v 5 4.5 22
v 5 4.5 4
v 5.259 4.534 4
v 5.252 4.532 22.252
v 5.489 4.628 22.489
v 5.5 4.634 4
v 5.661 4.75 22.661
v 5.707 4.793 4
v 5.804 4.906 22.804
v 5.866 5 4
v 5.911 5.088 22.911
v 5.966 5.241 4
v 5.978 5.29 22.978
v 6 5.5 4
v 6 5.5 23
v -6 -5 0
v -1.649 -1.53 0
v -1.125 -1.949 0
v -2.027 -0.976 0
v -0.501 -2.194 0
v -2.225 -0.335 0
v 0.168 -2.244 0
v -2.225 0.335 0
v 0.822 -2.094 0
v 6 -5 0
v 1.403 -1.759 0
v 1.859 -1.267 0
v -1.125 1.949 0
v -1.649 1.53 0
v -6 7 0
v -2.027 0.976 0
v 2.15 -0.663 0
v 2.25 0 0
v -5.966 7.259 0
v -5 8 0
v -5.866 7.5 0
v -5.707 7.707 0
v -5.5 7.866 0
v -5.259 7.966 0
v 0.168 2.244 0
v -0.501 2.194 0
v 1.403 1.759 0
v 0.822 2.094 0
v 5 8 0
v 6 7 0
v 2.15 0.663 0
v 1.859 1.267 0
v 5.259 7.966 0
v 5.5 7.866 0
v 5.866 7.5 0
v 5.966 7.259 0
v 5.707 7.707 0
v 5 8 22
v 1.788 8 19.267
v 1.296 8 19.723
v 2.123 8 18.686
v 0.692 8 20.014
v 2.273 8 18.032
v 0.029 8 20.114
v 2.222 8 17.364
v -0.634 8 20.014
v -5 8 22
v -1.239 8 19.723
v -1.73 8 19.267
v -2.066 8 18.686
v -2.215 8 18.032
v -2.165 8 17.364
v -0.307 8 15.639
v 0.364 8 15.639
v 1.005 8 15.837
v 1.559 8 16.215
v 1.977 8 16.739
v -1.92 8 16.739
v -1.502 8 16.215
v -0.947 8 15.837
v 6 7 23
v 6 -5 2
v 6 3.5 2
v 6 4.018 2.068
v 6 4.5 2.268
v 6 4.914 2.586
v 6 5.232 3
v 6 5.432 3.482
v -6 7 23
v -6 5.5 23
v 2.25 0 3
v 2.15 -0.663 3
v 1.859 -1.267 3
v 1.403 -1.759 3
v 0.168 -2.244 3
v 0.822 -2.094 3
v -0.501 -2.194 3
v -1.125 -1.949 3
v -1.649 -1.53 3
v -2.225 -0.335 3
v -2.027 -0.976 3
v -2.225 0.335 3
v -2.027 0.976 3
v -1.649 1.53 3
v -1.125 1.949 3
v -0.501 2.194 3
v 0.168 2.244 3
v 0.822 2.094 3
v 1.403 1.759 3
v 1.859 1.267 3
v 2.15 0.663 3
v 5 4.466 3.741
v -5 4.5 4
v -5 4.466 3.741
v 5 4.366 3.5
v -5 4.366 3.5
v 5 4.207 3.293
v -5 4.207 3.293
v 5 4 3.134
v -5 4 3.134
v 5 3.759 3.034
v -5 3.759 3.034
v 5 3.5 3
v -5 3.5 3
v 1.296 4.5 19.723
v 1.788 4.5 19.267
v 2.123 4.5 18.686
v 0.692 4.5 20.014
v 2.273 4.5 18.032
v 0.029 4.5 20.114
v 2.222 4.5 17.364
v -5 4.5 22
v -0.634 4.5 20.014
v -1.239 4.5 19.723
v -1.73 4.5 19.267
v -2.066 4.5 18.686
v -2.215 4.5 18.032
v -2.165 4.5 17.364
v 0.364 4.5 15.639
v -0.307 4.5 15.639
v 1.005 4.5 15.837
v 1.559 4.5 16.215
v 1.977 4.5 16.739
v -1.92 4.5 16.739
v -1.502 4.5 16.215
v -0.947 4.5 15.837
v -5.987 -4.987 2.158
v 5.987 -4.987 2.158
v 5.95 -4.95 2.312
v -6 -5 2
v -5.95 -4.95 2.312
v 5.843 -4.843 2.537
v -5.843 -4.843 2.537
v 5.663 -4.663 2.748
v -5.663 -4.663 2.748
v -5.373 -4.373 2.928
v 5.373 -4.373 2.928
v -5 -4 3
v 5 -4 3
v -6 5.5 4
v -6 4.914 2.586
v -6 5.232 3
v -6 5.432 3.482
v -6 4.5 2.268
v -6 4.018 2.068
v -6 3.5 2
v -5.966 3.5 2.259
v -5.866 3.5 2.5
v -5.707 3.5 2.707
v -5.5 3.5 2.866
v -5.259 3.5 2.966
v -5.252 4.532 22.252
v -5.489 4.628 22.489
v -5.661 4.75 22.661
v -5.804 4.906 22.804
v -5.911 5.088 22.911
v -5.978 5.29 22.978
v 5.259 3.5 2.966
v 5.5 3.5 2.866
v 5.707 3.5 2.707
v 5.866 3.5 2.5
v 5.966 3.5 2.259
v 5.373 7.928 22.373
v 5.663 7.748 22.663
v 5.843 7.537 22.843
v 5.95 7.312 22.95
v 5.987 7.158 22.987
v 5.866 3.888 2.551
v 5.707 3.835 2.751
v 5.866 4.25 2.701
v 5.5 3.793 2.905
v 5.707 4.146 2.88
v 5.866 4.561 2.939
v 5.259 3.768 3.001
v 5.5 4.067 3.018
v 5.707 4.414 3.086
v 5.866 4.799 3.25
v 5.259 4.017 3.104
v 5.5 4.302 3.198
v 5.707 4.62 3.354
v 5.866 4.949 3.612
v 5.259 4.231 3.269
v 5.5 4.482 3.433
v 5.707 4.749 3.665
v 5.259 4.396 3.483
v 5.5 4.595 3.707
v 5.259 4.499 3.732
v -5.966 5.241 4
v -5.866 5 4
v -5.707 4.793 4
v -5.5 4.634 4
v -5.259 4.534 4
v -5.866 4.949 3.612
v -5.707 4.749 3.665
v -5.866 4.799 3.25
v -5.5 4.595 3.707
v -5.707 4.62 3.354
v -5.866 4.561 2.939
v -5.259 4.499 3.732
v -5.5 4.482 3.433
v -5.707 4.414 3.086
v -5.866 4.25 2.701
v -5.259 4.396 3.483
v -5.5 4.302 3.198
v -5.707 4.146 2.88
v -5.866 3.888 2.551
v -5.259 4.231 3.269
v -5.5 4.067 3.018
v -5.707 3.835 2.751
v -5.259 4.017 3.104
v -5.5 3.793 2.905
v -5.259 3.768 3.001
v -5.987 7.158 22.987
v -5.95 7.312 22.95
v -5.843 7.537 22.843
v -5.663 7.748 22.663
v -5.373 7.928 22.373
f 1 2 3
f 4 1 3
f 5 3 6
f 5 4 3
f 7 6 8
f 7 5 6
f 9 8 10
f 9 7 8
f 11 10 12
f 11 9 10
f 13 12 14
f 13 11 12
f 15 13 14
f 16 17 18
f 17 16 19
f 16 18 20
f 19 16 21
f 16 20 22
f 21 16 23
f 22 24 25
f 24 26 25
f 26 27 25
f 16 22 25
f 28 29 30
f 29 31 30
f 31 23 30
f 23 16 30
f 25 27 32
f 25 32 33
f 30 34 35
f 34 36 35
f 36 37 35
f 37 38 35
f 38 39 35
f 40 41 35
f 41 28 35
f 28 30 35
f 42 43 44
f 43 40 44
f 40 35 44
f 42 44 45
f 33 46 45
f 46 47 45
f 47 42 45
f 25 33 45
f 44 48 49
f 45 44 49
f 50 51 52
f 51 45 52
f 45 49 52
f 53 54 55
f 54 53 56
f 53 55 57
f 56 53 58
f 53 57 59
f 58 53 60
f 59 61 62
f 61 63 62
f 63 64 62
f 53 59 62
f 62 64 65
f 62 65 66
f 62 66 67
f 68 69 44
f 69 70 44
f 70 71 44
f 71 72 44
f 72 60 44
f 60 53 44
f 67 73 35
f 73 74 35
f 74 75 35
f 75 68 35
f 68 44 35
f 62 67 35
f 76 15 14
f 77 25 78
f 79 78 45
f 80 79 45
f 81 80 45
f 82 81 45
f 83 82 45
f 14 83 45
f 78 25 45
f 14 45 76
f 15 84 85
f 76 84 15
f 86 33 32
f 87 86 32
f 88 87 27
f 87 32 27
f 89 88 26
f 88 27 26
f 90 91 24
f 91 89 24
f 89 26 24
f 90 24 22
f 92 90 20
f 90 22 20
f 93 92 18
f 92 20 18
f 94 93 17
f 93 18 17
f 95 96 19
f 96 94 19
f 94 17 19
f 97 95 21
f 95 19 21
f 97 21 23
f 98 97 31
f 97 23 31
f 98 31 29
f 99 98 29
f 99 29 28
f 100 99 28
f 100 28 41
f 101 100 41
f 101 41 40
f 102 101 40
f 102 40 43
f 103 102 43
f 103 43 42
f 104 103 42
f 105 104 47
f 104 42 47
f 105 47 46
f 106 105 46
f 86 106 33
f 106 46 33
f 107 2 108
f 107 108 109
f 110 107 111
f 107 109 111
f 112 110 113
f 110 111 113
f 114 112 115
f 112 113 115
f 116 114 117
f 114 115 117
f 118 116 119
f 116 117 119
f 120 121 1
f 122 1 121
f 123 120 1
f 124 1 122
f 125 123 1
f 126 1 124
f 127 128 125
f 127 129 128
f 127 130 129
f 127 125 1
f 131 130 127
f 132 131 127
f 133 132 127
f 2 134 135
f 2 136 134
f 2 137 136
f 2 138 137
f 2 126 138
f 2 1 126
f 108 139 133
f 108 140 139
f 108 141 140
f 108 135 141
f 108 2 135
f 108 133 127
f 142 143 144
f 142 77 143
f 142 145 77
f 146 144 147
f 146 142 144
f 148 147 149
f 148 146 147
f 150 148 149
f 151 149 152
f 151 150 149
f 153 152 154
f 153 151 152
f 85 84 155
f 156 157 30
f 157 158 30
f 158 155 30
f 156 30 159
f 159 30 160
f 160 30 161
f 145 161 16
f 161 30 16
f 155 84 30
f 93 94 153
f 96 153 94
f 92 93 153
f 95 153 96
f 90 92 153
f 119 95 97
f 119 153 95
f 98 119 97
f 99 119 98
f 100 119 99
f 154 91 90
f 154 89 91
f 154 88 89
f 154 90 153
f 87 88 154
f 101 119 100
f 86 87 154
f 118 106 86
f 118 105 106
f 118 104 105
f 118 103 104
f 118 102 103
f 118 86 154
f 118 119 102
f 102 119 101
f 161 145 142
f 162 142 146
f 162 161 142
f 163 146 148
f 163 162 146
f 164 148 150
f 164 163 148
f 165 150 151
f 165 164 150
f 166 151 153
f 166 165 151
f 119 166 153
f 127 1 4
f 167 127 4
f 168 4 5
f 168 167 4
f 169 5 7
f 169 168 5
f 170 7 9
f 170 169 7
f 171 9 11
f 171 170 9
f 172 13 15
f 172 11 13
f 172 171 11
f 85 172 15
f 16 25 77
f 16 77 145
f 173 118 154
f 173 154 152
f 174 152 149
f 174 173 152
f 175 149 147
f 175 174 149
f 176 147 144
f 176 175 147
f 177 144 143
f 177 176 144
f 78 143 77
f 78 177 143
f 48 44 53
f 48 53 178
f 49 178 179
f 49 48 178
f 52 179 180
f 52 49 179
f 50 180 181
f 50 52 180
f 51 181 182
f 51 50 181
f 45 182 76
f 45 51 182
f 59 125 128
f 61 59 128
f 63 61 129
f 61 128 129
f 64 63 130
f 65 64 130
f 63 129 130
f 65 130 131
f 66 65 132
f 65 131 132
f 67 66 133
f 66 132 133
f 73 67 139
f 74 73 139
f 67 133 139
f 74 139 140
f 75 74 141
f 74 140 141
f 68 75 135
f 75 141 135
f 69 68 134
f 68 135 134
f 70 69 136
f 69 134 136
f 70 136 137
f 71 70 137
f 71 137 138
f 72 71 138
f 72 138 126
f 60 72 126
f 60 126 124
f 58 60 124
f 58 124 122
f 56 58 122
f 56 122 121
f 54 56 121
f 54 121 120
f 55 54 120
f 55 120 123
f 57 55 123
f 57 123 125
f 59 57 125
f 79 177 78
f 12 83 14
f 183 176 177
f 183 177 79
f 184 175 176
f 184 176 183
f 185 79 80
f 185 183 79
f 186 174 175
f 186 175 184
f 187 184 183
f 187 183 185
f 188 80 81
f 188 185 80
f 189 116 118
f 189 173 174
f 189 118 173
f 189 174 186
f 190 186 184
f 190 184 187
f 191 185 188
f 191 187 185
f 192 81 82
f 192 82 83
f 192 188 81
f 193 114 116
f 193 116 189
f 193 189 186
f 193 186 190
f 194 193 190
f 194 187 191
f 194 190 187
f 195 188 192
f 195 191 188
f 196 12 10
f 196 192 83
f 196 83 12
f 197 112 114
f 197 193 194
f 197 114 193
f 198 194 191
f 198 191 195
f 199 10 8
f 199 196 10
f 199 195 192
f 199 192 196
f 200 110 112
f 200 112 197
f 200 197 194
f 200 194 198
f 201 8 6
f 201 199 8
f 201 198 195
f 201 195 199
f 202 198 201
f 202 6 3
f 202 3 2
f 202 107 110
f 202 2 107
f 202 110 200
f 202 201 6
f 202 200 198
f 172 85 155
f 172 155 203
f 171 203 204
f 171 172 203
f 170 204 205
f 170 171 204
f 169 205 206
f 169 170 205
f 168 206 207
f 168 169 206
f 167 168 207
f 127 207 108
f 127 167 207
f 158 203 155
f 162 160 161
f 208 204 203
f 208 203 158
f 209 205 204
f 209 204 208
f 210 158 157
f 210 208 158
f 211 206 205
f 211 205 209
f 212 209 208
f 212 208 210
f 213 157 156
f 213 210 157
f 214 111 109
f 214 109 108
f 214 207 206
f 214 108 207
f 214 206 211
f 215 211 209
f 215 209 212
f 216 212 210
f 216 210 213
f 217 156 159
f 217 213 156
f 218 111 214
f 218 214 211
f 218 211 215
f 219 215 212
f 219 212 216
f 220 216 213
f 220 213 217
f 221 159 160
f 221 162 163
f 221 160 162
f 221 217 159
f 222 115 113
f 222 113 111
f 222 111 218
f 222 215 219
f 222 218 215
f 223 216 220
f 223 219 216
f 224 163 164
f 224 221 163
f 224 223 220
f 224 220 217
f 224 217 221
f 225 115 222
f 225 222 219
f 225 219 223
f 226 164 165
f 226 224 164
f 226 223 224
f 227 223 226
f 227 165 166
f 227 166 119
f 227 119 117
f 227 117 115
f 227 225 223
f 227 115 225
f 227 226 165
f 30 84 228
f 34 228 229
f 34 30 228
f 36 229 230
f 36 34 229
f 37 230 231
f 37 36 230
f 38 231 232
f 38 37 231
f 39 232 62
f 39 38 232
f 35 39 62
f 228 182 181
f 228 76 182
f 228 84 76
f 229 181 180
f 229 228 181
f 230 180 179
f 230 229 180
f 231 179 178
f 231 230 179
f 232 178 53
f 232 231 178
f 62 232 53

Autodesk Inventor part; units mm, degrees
ref_plane "YZ Plane" through (0, 0, 0) normal (1, 0, 0) x (0, 1, 0)
ref_plane "XZ Plane" through (0, 0, 0) normal (0, 1, 0) x (-1, 0, 0)
ref_plane "XY Plane" through (0, 0, 0) normal (0, 0, 1) x (1, 0, 0)
sketch "Sketch1" plane through (0, 0, 0) normal (0, 0, 1) x (1, 0, 0)
  circle A0 centre (0, 0) radius 2.25
  line L0 (-6, 4.5) -> (6, 4.5)
  line L1 (6, 4.5) -> (6, -5)
  line L2 (6, -5) -> (-6, -5)
  line L3 (-6, -5) -> (-6, 4.5)
  line L4 (-6, 4.5) -> (6, 4.5)
  line L5 (6, 4.5) -> (6, 8)
  line L6 (6, 8) -> (-6, 8)
  line L7 (-6, 8) -> (-6, 4.5)
  dimension "d0" = 4.5
  dimension "d1" = 5
  dimension "d2" = 6
  dimension "d3" = 6
  dimension "d4" = 4.5
  dimension "d5" = 3.5
extrude "Extrusion1" add sketch "Sketch1" along normal blind 3
sketch "Sketch2" plane through (0, 0, 3) normal (0, 0, 1) x (1, 0, 0)
  line L0 (-6, -5) -> (6, -5) projected
  line L1 (6, -5) -> (6, 8) projected
  line L2 (6, 8) -> (-6, 8) projected
  line L3 (-6, 8) -> (-6, -5) projected
  circle A0 centre (0, 0) radius 2.25 projected
  line L4 (6, 8) -> (-6, 8) projected
  line L5 (-6, 8) -> (6, 8)
  line L6 (6, 8) -> (6, 4.5)
  line L7 (6, 4.5) -> (-6, 4.5)
  line L8 (-6, 4.5) -> (-6, 8)
  dimension "d8" = 3.5
extrude "Extrusion2" add sketch "Sketch2" along normal blind 20 contours L3 L2 L1 L7
sketch "Sketch3" plane through (-6, 8, 0) normal (0, 1, 0) x (1, 0, 0)
  point P0 (6, 0)
  point P1 (6.0288, -17.8643)
hole "Hole1" at (0.0288, 8, 17.8643) direction (0, -1, 0) diameter 4.5 depth 4 tip angle 118
fillet "Fillet1" radius 1 10 edges at (0, 4.5, 3) (0, 8, 23) (0, 4.5, 23) (0, -5, 3) (-6, -0.25, 3) (6, -0.25, 3) (6, 4.5, 13) (-6, 4.5, 13) (-6, 8, 11.5) (6, 8, 11.5)
properties part number "psu-bracket_3DPrint"
